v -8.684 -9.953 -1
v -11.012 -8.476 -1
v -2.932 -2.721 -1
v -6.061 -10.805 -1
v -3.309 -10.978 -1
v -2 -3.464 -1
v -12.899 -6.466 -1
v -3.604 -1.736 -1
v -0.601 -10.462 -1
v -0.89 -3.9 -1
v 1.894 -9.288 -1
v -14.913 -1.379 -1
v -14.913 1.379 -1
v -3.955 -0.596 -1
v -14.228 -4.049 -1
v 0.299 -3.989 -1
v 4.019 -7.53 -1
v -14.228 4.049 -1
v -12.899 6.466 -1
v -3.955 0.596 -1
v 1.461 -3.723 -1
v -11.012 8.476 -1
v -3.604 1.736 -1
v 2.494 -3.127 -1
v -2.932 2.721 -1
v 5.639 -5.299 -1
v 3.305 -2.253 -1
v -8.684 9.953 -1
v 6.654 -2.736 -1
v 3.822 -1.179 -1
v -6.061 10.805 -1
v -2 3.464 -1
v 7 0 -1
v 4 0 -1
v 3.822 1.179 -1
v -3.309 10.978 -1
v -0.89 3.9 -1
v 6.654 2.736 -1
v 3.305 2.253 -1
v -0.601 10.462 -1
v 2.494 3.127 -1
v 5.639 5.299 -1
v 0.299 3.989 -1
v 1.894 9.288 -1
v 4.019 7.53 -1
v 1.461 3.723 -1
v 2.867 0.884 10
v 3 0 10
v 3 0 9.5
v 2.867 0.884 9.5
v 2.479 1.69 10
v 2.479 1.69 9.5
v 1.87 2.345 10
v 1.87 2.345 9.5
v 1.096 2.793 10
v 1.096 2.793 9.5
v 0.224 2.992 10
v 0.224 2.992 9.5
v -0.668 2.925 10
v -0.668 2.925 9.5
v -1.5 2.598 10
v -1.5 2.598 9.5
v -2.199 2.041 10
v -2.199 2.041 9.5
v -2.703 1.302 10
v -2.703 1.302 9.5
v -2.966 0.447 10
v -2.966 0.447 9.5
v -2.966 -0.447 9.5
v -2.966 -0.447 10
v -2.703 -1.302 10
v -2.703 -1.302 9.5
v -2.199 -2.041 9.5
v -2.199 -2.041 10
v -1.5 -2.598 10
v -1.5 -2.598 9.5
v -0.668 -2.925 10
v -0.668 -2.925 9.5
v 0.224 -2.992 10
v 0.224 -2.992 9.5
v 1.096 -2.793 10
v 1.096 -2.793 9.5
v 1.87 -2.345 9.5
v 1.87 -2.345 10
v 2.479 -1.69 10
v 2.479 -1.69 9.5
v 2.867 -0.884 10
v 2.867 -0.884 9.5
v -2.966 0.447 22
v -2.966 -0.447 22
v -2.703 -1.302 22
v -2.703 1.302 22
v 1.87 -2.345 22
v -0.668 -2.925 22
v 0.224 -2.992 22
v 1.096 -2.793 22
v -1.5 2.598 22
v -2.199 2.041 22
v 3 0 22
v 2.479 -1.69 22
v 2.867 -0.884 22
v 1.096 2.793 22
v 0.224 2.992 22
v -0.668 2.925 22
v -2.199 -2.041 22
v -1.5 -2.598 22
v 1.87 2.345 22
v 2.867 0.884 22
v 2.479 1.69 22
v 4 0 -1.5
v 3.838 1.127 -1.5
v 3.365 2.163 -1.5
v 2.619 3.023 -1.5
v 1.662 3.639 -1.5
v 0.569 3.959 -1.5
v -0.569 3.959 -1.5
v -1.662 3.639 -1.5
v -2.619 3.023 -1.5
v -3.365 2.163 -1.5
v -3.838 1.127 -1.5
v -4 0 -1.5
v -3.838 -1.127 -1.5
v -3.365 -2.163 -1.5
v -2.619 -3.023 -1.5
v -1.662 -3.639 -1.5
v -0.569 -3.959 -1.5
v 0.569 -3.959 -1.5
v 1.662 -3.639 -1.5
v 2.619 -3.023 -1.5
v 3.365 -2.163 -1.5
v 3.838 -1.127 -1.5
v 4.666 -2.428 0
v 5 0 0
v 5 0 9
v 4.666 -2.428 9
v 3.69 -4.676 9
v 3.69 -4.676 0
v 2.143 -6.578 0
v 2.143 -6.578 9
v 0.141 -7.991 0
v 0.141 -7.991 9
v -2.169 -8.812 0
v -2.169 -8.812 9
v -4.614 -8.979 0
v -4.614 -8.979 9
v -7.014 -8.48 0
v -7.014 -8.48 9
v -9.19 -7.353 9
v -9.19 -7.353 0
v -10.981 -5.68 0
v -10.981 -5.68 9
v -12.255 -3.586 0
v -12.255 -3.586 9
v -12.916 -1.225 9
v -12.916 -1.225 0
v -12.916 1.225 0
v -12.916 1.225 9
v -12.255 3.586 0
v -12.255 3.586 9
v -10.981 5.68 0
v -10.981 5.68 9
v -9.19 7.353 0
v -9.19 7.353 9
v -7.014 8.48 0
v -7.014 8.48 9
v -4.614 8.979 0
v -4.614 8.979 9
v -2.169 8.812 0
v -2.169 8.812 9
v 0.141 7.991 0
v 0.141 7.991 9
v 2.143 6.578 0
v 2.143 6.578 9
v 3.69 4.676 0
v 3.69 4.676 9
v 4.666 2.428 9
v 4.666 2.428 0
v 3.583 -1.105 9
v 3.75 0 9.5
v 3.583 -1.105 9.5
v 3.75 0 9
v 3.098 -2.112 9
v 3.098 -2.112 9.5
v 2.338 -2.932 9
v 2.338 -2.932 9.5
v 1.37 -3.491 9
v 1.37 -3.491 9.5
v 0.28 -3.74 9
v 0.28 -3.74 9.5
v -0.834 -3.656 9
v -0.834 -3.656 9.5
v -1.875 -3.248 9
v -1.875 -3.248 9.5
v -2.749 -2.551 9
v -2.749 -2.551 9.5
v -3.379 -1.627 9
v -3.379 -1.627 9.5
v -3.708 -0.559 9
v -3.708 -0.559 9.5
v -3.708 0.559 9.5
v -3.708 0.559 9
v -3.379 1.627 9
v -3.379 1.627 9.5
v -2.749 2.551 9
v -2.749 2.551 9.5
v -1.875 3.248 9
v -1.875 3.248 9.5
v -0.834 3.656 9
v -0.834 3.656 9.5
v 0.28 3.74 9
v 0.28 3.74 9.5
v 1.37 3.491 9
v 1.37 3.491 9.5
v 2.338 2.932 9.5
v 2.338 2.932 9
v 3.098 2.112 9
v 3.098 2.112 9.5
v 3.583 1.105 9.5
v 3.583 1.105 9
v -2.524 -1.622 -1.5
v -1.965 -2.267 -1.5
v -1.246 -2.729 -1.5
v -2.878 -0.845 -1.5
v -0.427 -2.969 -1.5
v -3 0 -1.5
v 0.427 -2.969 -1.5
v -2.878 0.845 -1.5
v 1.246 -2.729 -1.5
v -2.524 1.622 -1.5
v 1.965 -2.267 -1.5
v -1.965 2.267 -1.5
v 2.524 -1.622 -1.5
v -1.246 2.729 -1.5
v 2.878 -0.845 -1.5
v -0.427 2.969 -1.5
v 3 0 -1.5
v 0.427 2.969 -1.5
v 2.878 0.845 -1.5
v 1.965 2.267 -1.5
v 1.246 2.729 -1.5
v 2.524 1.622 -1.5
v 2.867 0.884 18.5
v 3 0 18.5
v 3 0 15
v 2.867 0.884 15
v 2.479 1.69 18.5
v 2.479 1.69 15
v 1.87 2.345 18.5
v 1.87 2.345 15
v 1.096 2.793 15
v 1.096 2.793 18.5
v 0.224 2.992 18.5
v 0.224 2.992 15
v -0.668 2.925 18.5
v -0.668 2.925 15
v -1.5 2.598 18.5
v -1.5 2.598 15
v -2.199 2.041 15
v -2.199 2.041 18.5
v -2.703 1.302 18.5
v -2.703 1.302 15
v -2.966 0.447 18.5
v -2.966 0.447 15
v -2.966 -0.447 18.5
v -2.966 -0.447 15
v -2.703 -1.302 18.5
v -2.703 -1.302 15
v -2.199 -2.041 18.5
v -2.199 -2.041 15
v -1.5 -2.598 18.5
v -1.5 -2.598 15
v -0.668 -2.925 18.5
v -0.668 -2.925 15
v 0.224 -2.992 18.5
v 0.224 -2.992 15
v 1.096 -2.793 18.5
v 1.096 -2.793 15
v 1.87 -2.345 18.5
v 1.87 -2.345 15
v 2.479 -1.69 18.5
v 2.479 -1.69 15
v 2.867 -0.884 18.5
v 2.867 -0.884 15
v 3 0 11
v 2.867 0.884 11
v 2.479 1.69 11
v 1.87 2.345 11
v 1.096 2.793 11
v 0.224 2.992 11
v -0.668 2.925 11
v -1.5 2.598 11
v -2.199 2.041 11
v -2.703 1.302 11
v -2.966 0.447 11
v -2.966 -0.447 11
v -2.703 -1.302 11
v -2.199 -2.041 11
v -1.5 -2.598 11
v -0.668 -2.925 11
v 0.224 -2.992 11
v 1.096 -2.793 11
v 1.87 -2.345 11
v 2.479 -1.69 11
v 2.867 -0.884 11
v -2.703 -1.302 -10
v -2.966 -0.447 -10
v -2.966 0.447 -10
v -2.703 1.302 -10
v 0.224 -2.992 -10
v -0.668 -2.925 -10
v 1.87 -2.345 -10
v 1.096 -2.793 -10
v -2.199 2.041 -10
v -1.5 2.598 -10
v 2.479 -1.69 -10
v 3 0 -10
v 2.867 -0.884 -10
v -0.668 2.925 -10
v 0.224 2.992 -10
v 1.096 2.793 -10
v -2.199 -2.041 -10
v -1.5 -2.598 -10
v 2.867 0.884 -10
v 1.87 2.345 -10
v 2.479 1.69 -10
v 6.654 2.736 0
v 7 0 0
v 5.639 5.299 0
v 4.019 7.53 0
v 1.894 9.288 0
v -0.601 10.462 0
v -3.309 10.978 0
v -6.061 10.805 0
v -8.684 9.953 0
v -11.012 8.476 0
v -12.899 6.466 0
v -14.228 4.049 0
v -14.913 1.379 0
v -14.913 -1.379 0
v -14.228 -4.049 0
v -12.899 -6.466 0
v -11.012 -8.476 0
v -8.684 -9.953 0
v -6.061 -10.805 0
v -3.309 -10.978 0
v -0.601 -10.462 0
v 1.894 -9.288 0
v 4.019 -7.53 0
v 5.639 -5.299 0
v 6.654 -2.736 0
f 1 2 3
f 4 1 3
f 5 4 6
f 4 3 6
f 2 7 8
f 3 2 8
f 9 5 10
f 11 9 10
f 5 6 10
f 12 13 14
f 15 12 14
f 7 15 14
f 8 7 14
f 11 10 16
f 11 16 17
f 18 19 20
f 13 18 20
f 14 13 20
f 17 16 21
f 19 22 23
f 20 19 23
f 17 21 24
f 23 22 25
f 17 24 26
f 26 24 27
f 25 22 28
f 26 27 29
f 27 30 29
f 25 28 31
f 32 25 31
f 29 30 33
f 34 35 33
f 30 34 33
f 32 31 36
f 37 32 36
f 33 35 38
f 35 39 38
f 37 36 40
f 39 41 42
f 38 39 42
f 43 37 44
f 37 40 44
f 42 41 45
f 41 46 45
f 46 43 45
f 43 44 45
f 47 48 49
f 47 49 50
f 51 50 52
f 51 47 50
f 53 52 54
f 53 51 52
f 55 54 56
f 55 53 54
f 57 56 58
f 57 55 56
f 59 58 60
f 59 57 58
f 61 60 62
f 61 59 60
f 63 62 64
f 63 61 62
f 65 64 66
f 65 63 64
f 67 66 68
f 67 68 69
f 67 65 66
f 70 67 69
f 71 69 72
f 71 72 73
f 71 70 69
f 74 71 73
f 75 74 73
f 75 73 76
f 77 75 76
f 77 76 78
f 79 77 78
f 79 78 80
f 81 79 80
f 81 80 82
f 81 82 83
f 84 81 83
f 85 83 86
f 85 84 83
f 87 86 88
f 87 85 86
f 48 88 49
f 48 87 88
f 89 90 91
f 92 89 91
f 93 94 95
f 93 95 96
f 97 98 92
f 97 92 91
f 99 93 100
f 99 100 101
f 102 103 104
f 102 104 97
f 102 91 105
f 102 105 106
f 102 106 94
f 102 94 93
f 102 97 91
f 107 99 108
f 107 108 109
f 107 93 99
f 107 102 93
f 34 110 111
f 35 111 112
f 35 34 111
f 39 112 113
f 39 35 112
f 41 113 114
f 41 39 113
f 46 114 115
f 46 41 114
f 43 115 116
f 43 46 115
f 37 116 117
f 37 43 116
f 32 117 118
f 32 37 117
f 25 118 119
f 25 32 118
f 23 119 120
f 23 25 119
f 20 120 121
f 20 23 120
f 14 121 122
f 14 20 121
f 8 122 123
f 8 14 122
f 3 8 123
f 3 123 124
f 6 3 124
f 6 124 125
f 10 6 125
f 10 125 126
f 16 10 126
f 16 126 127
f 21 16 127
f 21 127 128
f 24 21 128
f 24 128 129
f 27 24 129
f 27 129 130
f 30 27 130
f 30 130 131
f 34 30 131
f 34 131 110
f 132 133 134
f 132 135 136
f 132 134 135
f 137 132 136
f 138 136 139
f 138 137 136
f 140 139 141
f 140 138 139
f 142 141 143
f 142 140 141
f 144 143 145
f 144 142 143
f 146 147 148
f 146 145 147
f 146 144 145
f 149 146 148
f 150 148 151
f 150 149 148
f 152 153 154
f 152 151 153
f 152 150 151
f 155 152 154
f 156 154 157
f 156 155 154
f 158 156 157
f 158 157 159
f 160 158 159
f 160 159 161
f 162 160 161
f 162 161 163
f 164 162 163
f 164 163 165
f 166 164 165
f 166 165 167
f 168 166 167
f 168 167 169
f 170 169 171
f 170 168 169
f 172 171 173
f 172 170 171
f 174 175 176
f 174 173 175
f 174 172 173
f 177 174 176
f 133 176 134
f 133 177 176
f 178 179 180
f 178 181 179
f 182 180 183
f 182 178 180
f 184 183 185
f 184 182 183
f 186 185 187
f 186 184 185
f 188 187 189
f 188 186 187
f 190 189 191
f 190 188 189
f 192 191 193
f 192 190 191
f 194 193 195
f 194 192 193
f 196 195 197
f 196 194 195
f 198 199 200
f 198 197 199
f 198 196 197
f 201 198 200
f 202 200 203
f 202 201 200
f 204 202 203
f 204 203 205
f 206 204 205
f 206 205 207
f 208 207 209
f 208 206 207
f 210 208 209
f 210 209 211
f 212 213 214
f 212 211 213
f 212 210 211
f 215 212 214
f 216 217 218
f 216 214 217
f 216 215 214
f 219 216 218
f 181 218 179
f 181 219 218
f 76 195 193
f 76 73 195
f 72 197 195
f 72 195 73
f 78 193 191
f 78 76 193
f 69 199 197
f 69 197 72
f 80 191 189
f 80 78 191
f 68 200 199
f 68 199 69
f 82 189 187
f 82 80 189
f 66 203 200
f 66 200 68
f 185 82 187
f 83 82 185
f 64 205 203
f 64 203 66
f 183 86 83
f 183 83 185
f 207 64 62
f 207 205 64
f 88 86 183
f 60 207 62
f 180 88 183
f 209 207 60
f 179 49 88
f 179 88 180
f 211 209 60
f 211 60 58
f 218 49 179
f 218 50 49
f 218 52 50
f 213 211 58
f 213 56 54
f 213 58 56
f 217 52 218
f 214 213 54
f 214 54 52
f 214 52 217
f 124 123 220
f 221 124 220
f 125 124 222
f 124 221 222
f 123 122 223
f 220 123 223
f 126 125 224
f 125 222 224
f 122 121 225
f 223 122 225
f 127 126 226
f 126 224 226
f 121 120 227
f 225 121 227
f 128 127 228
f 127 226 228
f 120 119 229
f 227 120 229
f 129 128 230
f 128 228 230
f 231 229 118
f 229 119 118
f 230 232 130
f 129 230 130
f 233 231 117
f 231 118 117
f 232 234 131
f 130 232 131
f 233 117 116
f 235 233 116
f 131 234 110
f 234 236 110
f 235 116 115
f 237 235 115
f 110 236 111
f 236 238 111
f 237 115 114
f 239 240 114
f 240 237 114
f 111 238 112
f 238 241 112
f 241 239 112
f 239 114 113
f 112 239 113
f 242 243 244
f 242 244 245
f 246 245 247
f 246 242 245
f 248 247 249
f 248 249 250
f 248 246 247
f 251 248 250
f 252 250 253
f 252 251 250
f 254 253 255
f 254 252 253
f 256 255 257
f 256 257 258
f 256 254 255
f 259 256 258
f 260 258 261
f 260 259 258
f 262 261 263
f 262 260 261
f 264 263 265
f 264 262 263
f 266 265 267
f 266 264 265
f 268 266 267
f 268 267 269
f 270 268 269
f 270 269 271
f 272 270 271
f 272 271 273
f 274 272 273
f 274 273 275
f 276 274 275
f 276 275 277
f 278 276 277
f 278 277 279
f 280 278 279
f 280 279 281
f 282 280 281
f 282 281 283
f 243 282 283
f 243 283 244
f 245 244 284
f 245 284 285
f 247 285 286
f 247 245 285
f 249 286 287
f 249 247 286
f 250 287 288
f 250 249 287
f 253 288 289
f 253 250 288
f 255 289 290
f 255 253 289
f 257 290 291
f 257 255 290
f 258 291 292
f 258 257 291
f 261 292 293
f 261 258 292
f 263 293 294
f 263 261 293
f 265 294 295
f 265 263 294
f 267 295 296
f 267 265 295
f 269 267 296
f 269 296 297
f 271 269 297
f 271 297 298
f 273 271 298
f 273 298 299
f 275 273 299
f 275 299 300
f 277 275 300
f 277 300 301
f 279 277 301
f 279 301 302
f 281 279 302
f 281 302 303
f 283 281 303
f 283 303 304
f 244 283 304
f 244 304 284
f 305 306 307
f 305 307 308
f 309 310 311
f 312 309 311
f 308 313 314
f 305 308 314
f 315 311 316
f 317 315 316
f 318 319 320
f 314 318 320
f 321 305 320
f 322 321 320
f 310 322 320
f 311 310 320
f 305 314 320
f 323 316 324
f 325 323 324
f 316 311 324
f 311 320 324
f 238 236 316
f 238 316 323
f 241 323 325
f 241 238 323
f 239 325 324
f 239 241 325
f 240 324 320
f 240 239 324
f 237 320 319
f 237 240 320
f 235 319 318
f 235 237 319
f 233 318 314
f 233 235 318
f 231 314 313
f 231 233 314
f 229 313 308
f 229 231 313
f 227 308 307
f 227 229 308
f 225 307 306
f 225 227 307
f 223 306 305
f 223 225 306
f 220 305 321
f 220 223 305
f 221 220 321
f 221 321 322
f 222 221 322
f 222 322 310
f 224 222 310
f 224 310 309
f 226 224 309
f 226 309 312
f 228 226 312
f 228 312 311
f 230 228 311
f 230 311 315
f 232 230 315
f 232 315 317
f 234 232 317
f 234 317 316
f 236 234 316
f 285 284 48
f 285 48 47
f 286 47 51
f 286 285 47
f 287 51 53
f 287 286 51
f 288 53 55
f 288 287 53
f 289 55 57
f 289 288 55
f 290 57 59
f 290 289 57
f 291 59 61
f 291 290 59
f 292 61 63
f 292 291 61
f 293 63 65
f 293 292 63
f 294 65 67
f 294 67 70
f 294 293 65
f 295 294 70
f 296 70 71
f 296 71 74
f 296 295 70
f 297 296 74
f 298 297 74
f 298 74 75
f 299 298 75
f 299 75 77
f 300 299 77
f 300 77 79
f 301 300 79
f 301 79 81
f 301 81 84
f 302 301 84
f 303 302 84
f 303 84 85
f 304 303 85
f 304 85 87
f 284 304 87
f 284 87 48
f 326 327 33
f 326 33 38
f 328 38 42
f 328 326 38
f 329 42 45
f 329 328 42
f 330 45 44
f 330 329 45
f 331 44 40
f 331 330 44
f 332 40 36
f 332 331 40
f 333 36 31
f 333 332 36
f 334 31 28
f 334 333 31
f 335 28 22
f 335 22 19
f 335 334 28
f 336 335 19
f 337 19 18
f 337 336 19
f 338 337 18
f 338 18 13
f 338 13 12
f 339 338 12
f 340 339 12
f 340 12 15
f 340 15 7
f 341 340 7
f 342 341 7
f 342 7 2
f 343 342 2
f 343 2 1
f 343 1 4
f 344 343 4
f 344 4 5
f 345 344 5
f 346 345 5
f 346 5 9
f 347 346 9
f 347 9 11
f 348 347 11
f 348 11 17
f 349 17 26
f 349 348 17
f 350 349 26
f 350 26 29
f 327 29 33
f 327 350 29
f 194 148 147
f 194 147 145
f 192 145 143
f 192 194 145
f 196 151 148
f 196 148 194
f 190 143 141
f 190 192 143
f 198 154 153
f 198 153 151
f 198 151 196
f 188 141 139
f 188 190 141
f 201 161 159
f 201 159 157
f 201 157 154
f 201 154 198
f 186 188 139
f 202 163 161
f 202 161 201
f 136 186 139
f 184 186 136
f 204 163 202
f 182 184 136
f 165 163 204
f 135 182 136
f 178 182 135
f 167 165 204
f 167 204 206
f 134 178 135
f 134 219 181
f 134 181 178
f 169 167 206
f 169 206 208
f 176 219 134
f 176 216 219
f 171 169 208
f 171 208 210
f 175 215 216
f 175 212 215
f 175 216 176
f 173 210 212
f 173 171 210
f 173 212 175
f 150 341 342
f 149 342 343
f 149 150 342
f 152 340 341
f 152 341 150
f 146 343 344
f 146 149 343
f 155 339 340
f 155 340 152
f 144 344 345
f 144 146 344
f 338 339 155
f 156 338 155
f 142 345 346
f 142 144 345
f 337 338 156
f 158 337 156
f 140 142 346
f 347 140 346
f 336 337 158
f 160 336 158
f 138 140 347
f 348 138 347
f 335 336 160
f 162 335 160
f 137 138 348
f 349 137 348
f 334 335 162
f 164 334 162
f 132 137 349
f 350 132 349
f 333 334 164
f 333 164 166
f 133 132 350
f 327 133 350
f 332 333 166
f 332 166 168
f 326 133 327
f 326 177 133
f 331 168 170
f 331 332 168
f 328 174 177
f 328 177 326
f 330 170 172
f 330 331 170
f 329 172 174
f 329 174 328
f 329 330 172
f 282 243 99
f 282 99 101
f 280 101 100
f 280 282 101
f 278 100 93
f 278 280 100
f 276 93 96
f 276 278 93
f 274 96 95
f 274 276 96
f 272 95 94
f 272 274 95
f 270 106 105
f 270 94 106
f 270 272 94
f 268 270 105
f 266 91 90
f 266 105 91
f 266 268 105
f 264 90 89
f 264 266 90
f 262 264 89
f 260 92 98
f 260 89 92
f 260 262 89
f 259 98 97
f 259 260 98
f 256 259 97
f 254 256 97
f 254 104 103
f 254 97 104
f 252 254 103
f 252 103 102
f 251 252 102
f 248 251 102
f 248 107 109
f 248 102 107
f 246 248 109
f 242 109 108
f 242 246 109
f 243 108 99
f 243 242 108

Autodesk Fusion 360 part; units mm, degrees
sketch "スケッチ1" plane through (0, 0, 0) normal (0, 0, 1) x (1, 0, 0)
  circle A0 centre (0, 0) radius 3
  line L0 (0, 0) -> (-4, 0)
  circle A1 centre (-4, 0) radius 9
  circle A2 centre (0, 0) radius 4
  dimension "d1" = 6
  dimension "d2" = 4
  dimension "d3" = 18
  dimension "d14" = 8
extrude "押し出し1" add sketch "スケッチ1" against normal blind 10 contours A0
extrude "押し出し2" add sketch "スケッチ1" along normal blind 17 contours A0 | A2 | A1
sketch "スケッチ2" plane through (0, 0, 17) normal (0, 0, 1) x (1, 0, 0)
  circle A0 centre (-4, 0) radius 9
  circle A1 centre (0, 0) radius 3
  circle A2 centre (0, 0) radius 4
  dimension "d8" = 6
  dimension "d11" = 8
extrude "押し出し3" add sketch "スケッチ2" along normal blind 10 contours A1
extrude "押し出し4" add sketch "スケッチ2" along normal blind 1.5 contours A2
extrude "押し出し5" add sketch "スケッチ1" against normal blind 1.5 contours A2
extrude "押し出し6" cut sketch "スケッチ2" against normal blind 5 contours A0
extrude "押し出し7" cut 1 faces at (3.6406, -0.3478, 18.5) along direction (0, 0, -1) blind 5
extrude "押し出し8" cut 1 faces at (-9.9665, 0.4471, 12) along direction (0, 0, -1) blind 3.5
extrude "押し出し9" cut 1 faces at (3.6406, -0.3478, 13.5) along direction (0, 0, -1) blind 3.5
extrude "押し出し10" cut 1 faces at (0.3505, -0.866, 27) along direction (0, 0, -1) blind 5
extrude "押し出し11" add 1 faces at (3.6406, -0.3478, 10) along direction (0, 0, 1) blind 5
extrude "押し出し12" cut 1 faces at (-9.9665, 0.4471, 8.5) along direction (0, 0, -1) blind 1.5
extrude "押し出し13" add 1 faces at (-9.9665, 0.4471, 7) along direction (0, 0, 1) blind 1
extrude "押し出し14" cut 1 faces at (3.6406, -0.3478, 15) along direction (0, 0, -1) blind 6.5
extrude "押し出し15" add 1 faces at (3.6406, -0.3478, 8.5) along direction (0, 0, 1) blind 0.5
extrude "押し出し16" cut 1 faces at (3.6406, -0.3478, 9) along direction (0, 0, -1) blind 0.5
extrude "押し出し17" add 1 faces at (3.6406, -0.3478, 8.5) along direction (0, 0, 1) blind 0.5
sketch "スケッチ3" plane through (0, 0, 0) normal (0, 0, 1) x (1, 0, 0)
  circle A0 centre (-4, 0) radius 11
  circle A1 centre (-4, 0) radius 9
  dimension "d41" = 22
extrude "押し出し18" add sketch "スケッチ3" against normal blind 1 contours A0 | A1
extrude "押し出し19" add 1 faces at (3.6406, -0.3478, 9) along direction (0, 0, 1) blind 2
extrude "押し出し20" add 1 faces at (-9.9665, 0.4471, 8) along direction (0, 0, 1) blind 2
extrude "押し出し21" cut 1 faces at (3.6406, -0.3478, 11) along direction (0, 0, -1) blind 1
extrude "押し出し22" cut 1 faces at (-9.6332, 0.4471, 10) along direction (0, 0, -1) blind 1
sketch "スケッチ4" plane through (0, 0, 9) normal (0, 0, 1) x (1, 0, 0)
  circle A0 centre (0, 0) radius 3
  circle A1 centre (-4, 0) radius 9
  circle A2 centre (0, 0) radius 3.75
  dimension "d52" = 7.5
extrude "押し出し23" add sketch "スケッチ4" along normal blind 0.5 contours A2
